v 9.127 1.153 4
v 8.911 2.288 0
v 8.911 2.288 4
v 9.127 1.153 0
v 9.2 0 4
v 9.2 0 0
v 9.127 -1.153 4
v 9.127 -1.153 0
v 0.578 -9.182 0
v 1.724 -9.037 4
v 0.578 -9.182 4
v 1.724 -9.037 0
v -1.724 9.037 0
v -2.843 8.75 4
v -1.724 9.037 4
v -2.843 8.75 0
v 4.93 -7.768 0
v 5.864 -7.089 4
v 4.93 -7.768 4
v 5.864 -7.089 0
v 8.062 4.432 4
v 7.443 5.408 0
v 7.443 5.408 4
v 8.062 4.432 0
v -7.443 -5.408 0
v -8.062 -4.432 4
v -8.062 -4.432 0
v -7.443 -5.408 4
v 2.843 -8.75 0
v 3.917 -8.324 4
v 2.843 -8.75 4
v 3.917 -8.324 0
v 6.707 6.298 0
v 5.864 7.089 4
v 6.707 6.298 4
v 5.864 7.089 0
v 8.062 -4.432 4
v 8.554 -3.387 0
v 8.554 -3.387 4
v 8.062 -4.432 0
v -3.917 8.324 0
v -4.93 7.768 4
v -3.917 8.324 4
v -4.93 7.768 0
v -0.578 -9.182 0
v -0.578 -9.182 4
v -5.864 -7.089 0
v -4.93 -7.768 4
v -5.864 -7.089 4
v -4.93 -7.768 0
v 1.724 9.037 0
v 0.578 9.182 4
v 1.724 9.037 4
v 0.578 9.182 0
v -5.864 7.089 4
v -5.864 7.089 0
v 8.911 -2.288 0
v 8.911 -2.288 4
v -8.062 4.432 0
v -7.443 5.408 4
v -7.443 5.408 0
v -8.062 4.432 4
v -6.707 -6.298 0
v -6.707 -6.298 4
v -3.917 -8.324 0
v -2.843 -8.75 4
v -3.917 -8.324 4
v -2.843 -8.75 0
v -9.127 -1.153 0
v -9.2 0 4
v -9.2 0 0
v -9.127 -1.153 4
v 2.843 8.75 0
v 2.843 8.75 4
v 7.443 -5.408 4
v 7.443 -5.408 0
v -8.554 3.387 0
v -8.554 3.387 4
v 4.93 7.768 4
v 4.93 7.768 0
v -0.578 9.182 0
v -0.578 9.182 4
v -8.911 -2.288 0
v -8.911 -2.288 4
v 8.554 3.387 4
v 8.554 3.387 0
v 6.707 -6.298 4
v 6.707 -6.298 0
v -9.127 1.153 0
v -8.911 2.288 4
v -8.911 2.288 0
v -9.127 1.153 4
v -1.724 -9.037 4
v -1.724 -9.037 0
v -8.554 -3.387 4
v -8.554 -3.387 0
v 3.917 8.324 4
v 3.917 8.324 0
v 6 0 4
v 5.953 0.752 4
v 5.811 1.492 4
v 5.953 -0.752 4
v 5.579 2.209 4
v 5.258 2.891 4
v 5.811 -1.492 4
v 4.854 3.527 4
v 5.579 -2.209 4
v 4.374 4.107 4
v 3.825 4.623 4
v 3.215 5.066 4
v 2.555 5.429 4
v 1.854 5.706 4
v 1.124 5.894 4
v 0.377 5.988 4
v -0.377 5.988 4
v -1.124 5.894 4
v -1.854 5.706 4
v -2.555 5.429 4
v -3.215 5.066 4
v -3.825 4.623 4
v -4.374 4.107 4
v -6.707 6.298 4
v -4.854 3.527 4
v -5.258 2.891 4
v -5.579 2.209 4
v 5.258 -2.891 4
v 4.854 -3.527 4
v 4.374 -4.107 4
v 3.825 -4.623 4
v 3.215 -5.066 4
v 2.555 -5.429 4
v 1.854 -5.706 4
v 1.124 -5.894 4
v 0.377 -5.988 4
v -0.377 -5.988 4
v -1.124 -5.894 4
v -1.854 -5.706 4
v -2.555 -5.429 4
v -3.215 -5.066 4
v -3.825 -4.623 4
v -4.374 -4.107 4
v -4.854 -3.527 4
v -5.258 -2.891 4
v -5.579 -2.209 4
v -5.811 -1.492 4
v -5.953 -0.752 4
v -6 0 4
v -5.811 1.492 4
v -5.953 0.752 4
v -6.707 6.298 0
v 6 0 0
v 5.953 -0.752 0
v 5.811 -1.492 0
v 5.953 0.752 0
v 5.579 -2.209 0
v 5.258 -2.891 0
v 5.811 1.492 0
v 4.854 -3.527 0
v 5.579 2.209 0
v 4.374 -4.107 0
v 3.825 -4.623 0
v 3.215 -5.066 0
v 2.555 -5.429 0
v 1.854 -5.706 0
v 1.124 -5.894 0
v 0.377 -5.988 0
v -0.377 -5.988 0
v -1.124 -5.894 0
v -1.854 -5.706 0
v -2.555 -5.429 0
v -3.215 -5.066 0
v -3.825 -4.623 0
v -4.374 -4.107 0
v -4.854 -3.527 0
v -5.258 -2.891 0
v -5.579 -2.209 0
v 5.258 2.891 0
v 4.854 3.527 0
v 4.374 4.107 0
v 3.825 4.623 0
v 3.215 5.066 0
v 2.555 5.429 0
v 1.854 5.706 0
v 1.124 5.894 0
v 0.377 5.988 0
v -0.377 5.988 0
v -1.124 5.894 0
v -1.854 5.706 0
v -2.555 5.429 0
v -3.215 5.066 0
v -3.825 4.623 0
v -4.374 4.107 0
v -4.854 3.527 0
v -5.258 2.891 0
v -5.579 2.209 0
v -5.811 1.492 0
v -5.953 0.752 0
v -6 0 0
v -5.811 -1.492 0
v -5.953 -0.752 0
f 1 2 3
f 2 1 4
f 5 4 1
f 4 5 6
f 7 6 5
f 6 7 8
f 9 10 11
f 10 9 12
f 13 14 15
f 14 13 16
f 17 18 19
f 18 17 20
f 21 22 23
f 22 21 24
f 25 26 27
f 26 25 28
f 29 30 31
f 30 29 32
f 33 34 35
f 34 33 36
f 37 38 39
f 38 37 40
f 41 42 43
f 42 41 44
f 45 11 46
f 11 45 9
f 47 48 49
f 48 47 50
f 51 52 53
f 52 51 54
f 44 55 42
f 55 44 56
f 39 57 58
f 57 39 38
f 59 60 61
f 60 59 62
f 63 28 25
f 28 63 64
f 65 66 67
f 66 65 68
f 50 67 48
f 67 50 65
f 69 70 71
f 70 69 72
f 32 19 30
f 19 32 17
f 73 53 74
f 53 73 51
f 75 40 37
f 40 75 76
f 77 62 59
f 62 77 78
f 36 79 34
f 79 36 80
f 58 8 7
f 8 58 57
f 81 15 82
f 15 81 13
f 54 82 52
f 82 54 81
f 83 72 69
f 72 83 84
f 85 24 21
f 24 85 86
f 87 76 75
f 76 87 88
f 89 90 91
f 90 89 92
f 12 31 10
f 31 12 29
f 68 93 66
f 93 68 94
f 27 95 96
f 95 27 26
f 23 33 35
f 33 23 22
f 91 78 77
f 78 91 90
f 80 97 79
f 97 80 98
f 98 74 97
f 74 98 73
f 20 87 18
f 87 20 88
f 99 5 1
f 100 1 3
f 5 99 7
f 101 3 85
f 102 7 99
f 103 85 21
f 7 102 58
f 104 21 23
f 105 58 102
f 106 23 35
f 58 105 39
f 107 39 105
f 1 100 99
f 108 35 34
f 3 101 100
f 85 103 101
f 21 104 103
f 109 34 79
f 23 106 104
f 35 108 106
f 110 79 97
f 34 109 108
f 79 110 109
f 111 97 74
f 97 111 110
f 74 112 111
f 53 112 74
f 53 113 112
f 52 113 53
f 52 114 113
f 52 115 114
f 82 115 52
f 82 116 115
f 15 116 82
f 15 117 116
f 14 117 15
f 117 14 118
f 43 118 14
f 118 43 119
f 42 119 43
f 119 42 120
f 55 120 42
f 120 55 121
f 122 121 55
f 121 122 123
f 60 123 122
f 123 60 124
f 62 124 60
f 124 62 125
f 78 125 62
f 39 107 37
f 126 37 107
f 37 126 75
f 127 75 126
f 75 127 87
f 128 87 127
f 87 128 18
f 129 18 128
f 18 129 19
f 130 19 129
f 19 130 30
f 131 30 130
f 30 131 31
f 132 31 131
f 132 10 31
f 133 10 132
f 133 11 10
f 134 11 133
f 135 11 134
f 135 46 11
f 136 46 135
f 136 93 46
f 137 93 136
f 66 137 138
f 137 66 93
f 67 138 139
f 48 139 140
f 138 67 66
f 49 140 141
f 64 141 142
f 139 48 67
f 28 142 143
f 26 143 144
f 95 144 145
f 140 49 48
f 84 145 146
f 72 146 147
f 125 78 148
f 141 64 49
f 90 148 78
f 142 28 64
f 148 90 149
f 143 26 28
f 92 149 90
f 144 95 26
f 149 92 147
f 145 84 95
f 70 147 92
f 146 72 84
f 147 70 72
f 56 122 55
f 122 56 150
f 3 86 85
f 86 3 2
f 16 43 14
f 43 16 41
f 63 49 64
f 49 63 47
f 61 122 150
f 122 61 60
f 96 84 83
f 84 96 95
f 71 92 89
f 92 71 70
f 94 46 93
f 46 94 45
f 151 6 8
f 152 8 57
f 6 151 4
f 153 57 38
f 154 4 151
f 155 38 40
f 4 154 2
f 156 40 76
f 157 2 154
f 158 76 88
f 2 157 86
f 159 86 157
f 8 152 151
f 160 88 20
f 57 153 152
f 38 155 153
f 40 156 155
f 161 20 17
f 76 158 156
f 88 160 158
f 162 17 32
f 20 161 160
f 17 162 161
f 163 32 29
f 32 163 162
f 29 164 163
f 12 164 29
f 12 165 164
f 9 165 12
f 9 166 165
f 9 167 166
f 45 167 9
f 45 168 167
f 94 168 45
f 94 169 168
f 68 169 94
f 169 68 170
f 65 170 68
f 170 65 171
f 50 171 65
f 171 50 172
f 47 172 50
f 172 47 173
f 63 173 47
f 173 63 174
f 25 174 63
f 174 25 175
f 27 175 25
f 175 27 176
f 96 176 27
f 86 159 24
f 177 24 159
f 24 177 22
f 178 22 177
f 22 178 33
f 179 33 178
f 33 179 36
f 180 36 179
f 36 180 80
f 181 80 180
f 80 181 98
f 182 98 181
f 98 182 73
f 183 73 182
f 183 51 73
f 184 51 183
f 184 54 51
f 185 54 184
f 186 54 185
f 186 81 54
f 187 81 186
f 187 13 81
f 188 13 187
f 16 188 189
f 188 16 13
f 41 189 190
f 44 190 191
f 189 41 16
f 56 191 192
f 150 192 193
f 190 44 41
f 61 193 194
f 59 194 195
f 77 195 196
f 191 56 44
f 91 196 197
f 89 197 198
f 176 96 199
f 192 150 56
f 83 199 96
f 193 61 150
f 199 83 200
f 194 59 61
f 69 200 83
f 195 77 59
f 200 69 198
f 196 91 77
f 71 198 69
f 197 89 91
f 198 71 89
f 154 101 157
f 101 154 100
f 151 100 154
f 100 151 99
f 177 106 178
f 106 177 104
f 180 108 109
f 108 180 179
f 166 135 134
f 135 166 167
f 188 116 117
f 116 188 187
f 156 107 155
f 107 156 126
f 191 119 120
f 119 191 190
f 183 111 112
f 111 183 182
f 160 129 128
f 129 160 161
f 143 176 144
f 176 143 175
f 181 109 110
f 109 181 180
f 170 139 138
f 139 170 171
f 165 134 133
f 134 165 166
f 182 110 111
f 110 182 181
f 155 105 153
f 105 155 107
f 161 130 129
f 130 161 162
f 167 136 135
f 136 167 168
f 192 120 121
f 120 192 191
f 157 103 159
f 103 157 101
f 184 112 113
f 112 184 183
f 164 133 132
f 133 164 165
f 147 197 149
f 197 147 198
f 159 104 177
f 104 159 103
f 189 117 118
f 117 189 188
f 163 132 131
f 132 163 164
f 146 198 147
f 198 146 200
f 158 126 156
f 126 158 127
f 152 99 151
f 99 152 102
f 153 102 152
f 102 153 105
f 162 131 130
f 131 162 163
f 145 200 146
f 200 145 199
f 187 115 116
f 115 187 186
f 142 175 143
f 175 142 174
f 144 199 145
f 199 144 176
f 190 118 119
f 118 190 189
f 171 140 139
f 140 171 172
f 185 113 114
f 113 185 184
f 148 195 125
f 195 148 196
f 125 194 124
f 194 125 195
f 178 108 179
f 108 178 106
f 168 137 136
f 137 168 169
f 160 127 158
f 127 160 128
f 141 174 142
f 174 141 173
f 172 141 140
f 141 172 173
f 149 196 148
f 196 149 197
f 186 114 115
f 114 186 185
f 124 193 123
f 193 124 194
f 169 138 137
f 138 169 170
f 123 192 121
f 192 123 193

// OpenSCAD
$fn = 50;


difference() {
	union() {
		cylinder(h = 4, r = 9.2000000000);
	}
	union() {
		cylinder(h = 4, r = 6.0000000000);
	}
}
